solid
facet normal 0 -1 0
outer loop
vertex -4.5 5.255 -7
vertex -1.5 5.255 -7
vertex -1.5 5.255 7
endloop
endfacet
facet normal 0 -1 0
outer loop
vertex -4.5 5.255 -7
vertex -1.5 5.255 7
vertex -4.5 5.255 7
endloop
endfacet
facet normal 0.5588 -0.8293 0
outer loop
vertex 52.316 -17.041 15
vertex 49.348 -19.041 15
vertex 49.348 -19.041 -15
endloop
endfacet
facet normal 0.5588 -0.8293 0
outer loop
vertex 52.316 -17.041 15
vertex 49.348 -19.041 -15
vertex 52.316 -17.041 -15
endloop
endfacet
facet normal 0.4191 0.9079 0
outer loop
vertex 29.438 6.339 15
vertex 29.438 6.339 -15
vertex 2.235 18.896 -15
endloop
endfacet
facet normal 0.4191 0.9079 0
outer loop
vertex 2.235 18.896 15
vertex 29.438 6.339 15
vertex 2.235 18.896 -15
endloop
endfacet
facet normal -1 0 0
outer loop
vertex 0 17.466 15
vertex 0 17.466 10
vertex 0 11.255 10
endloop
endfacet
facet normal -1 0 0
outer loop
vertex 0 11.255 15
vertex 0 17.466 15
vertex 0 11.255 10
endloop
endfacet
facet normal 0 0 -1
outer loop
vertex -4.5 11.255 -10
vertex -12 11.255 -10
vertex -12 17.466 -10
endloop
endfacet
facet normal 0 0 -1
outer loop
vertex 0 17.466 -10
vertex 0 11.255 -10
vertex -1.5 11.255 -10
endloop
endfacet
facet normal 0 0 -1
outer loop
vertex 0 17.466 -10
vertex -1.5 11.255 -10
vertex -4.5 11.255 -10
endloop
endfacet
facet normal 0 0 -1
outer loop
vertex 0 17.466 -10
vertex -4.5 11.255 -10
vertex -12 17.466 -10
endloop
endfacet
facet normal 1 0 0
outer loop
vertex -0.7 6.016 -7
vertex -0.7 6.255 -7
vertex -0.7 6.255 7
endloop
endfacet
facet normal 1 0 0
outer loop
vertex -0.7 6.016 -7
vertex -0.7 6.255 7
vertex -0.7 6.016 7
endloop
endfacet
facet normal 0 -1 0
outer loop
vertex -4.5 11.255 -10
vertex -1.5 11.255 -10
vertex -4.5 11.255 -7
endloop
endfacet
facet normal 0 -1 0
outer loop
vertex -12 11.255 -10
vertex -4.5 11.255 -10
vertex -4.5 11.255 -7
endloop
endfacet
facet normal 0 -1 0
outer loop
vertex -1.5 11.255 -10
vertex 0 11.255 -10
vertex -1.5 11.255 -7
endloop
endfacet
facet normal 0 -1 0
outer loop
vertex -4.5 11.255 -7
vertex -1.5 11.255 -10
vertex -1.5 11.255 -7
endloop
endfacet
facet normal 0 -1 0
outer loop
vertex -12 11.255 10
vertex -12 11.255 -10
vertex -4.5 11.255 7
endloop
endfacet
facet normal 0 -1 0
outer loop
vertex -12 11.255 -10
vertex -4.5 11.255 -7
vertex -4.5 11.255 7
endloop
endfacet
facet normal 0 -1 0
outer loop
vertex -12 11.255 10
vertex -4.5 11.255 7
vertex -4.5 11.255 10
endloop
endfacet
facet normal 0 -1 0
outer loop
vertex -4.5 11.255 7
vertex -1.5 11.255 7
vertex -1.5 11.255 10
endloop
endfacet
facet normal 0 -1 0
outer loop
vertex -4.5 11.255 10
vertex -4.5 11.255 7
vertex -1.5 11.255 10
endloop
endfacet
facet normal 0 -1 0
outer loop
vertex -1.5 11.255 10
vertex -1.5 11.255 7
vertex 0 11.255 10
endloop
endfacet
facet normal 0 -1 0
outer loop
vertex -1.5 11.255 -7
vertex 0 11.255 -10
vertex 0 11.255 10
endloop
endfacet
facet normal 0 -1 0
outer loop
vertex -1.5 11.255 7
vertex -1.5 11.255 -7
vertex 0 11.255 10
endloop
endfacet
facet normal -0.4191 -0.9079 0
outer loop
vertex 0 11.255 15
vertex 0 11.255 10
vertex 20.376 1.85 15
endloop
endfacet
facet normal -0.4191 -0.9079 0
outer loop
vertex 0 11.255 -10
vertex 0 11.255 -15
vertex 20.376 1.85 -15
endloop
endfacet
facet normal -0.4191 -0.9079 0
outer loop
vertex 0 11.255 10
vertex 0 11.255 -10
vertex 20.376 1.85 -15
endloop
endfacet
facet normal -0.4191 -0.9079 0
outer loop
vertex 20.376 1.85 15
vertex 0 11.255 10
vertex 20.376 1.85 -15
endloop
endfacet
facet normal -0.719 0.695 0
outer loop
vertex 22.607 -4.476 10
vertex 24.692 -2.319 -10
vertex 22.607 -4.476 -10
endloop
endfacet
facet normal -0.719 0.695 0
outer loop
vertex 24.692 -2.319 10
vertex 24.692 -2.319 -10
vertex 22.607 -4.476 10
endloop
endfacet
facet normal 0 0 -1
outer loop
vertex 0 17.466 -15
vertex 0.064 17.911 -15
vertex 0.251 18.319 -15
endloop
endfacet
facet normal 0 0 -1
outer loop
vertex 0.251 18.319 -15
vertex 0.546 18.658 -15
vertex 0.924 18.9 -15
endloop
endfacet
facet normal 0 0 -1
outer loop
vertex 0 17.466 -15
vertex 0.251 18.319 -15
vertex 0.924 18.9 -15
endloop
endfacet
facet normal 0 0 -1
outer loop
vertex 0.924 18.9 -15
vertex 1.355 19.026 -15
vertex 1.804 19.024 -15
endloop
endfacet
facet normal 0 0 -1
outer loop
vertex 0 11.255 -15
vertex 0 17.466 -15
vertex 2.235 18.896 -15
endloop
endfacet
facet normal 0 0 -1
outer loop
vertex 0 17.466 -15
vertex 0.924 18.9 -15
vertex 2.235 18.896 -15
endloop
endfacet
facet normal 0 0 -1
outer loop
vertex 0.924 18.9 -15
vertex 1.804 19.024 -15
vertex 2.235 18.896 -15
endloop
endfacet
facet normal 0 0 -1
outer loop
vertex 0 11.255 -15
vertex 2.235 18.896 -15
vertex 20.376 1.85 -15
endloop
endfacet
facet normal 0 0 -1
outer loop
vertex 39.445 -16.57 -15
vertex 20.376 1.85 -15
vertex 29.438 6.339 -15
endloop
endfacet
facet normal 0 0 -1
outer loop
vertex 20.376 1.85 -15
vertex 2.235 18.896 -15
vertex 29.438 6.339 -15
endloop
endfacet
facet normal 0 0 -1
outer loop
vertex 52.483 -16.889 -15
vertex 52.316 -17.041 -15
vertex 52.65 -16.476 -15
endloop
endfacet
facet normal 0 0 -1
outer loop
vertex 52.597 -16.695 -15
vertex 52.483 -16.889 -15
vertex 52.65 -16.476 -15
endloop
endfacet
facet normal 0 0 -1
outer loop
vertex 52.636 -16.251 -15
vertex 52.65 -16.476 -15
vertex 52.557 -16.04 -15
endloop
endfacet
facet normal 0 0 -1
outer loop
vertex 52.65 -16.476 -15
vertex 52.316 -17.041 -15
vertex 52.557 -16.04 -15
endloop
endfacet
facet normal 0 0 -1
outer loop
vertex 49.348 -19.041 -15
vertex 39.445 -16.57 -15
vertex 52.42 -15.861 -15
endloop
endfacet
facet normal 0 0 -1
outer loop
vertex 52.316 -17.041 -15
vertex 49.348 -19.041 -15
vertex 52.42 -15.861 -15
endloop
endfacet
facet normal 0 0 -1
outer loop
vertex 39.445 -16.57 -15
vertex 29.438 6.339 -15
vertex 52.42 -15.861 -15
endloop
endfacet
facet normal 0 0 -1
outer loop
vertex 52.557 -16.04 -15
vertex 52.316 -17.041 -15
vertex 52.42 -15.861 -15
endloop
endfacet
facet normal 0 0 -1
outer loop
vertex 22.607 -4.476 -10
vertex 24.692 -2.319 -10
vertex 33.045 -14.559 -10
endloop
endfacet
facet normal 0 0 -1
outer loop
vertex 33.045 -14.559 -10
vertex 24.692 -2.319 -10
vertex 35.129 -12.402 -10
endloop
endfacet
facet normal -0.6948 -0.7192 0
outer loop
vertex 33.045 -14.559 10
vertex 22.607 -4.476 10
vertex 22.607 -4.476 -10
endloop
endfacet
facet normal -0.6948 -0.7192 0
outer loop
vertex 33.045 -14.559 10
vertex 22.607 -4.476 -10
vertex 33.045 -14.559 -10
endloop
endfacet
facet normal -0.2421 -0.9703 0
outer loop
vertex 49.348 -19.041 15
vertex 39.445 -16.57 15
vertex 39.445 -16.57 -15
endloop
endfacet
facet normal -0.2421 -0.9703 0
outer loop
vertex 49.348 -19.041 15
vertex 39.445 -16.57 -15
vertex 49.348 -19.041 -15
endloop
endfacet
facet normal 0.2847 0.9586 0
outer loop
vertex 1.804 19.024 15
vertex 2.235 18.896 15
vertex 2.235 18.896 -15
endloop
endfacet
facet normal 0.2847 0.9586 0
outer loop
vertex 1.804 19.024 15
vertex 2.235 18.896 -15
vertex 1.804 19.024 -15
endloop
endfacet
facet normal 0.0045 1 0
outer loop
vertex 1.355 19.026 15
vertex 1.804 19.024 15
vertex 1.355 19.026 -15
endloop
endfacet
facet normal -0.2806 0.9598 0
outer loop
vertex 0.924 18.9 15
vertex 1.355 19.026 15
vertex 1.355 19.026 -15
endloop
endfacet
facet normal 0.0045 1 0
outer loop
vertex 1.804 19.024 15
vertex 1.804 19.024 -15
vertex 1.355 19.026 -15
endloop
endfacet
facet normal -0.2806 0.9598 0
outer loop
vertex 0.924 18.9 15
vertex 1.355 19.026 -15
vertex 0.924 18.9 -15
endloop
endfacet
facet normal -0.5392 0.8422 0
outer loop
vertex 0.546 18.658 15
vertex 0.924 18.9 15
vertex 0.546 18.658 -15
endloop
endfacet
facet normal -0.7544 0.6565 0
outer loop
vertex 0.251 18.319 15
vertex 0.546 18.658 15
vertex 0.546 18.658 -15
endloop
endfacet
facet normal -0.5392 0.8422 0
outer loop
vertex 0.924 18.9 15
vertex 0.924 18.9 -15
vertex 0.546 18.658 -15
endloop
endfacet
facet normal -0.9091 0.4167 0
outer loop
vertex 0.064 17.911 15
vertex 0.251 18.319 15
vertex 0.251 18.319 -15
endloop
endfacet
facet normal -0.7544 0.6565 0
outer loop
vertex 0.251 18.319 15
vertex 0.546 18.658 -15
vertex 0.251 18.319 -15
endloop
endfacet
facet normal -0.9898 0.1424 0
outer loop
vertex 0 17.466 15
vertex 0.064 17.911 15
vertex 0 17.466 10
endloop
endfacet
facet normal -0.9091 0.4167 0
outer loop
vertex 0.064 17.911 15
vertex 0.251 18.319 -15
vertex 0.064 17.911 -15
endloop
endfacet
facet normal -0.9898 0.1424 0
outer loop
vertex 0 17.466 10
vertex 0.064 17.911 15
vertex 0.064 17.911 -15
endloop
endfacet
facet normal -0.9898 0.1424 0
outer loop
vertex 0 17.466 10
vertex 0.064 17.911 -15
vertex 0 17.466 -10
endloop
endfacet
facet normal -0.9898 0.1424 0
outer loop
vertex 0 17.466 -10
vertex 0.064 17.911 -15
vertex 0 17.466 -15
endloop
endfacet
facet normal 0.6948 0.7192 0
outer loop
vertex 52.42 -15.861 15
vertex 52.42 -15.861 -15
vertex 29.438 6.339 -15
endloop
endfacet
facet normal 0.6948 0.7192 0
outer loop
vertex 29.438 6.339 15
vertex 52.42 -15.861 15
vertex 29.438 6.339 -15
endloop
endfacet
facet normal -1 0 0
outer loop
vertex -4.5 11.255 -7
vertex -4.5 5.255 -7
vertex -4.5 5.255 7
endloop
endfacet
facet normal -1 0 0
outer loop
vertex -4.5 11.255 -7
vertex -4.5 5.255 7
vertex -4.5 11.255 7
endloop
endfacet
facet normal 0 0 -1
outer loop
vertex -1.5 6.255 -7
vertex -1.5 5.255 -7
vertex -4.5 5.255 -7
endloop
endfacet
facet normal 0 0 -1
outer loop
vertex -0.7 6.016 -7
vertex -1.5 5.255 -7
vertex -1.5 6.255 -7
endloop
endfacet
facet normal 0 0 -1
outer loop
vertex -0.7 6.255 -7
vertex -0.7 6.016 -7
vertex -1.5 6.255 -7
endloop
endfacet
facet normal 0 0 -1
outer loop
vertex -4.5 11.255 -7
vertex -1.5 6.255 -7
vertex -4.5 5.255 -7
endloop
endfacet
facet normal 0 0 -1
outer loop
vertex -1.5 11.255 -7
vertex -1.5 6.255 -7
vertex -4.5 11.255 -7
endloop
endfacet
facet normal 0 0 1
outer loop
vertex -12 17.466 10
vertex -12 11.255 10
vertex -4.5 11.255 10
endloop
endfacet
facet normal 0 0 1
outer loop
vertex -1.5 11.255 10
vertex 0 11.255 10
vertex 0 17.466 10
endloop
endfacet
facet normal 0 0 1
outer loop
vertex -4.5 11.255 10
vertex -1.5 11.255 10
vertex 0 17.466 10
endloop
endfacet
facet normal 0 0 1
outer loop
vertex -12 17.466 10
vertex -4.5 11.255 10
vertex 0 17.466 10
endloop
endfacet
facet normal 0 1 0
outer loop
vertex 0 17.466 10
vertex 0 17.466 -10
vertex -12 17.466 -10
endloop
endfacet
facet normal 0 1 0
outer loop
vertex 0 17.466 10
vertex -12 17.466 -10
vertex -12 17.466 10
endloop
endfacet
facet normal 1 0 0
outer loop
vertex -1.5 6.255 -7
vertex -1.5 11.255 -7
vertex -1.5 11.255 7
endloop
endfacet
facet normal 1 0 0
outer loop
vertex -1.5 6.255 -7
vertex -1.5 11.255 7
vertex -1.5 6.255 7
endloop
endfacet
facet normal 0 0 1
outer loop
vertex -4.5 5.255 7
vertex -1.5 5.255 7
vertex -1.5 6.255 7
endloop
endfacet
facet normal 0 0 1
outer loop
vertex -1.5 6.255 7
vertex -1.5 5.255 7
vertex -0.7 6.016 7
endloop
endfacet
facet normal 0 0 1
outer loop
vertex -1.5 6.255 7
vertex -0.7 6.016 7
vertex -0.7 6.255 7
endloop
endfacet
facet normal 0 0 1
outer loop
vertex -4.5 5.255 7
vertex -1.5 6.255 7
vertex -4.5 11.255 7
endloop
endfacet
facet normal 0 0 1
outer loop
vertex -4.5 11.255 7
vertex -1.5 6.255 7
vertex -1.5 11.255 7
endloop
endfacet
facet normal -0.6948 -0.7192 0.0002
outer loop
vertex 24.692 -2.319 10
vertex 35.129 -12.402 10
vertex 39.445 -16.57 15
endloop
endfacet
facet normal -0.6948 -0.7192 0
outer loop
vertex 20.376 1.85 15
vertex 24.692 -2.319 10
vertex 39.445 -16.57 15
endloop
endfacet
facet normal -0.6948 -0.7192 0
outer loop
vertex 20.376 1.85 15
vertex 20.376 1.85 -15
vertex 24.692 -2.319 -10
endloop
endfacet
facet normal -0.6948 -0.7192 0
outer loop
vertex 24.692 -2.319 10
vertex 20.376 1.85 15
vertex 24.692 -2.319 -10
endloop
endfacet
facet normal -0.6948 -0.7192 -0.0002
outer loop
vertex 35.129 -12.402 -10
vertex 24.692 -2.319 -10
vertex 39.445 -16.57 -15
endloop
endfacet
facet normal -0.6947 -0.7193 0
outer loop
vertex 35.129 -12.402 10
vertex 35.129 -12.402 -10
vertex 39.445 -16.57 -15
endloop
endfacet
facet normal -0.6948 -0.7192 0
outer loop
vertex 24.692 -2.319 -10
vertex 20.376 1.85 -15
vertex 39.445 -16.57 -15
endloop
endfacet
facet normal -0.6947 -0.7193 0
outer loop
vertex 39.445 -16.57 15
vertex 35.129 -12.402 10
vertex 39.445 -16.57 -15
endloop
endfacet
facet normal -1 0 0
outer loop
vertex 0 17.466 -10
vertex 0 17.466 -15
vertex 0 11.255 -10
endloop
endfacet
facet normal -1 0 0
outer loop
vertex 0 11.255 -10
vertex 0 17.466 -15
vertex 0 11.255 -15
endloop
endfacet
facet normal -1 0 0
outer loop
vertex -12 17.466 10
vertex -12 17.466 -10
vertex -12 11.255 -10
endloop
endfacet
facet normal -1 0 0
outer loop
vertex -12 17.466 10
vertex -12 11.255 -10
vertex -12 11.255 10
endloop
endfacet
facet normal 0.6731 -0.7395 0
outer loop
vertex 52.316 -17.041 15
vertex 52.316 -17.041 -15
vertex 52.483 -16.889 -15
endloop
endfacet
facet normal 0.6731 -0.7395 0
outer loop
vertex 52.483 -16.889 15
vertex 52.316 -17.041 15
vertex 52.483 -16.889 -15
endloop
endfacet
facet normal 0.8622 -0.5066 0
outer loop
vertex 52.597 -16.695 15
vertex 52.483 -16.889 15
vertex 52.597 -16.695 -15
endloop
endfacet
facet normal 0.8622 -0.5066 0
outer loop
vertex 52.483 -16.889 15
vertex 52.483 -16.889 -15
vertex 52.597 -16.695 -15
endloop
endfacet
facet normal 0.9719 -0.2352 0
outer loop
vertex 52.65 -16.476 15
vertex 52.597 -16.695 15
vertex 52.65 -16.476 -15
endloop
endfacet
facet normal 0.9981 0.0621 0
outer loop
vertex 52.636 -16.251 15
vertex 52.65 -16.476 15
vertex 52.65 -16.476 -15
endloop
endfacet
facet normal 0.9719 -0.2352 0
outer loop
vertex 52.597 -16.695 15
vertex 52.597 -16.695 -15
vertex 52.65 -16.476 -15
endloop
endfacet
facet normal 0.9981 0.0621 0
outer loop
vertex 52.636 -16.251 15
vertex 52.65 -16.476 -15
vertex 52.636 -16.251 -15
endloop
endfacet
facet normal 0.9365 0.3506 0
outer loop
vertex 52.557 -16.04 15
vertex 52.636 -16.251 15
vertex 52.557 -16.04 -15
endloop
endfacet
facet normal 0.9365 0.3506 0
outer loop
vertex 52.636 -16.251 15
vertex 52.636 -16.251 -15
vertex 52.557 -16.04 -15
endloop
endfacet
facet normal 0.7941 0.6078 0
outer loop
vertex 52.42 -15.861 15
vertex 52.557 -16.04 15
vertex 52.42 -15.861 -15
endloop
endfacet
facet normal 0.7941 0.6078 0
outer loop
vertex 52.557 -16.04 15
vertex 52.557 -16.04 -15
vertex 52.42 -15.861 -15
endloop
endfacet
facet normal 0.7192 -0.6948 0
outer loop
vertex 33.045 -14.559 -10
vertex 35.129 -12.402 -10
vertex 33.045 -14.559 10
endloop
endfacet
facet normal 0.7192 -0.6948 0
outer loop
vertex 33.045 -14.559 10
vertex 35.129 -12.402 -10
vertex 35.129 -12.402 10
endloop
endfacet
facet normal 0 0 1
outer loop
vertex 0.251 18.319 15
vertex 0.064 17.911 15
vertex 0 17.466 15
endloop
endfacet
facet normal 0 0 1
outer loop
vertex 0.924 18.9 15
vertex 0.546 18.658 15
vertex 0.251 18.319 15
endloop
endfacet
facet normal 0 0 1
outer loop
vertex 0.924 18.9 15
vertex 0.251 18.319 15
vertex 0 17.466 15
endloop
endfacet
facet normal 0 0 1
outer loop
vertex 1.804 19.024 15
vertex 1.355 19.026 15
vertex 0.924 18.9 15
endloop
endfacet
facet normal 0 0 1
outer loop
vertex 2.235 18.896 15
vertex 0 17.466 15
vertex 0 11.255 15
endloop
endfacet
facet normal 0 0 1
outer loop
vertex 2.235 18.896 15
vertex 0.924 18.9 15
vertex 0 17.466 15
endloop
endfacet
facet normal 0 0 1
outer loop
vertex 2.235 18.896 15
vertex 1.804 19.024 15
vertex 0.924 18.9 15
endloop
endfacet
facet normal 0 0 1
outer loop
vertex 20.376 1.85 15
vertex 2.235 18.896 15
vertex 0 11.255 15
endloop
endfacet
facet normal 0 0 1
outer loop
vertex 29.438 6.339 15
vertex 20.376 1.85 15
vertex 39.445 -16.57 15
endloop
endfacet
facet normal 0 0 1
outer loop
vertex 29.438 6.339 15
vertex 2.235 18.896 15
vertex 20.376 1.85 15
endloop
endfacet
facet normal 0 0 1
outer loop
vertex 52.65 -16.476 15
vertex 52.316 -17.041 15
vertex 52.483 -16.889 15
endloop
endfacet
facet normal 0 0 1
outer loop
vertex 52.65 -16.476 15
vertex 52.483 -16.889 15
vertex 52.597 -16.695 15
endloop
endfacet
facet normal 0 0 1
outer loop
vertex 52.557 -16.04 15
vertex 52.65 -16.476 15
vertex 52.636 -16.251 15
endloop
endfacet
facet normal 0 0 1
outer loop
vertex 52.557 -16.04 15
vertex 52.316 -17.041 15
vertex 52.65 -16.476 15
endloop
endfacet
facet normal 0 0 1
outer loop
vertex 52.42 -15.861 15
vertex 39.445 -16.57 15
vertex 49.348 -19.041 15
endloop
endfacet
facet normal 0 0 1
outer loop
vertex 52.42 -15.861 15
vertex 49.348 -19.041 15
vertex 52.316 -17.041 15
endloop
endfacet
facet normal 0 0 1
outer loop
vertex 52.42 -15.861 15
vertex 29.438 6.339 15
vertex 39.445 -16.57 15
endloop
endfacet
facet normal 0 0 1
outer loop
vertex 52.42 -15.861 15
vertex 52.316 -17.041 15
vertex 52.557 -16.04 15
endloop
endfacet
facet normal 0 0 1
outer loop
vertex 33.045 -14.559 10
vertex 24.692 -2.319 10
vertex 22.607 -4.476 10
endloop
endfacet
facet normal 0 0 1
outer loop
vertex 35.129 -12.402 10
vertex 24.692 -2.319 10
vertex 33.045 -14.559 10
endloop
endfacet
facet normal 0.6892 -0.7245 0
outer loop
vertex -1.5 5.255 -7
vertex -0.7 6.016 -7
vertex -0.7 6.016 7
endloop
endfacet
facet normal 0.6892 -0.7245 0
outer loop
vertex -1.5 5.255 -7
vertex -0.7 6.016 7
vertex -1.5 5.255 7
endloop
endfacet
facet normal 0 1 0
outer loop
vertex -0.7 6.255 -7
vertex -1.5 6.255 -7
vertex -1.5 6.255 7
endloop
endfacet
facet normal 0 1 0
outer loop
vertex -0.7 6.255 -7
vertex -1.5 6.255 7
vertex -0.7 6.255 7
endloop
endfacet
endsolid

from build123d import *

# Parameters (mm, degrees)
RESSALTO_EXTRUS_O1_DEPTH      = 15
RESSALTO_EXTRUS_O1_DEPTH_BACK = 15
ESBO_O2_W                     = 20
ESBO_O2_H                     = 6.210978077
RESSALTO_EXTRUS_O2_DEPTH      = 12
RESSALTO_EXTRUS_O3_START      = -20
RESSALTO_EXTRUS_O3_DEPTH      = 20
CORTE_EXTRUS_O1_START         = -3.8
ESBO_O6_W                     = 3
ESBO_O6_H                     = 6
CORTE_EXTRUS_O1_DEPTH         = 3.8
ESBO_O7_W                     = 14.512469108
ESBO_O7_H                     = 20
RESSALTO_EXTRUS_O4_DEPTH      = 3


with BuildPart() as part:
    # Esboço1 → Ressalto-extrusão1 (new, two sides: drawn at the far end of the back side and taken through both)
    with BuildSketch(Plane.XY.offset(-RESSALTO_EXTRUS_O1_DEPTH_BACK)):
        with BuildLine():
            Line((0, 16.196411572), (0, 11.255433495))
            Line((0, 11.255433495), (20.3764132, 1.849909993))
            Line((20.3764132, 1.849909993), (39.444832225, -16.570361831))
            Line((39.444832225, -16.570361831), (49.347871005, -19.041211572))
            Line((49.347871005, -19.041211572), (52.316343324, -17.041005068))
            ThreePointArc((52.316343324, -17.041005068), (52.649617834, -16.475732), (52.419959407, -15.861026747))
            Line((52.419959407, -15.861026747), (29.43843308, 6.339343474))
            Line((29.43843308, 6.339343474), (2.234792117, 18.89623864))
            ThreePointArc((2.234792117, 18.89623864), (0.726083483, 18.792939111), (0, 17.466411572))
            Line((0, 17.466411572), (0, 16.196411572))
        make_face()
    extrude(amount=RESSALTO_EXTRUS_O1_DEPTH + RESSALTO_EXTRUS_O1_DEPTH_BACK)

    # Esboço2 → Ressalto-extrusão2 (add)
    with BuildSketch(Plane.ZY):
        with Locations((0, 14.360922534)):
            Rectangle(ESBO_O2_W, ESBO_O2_H)
    extrude(amount=RESSALTO_EXTRUS_O2_DEPTH)

    # Esboço4 → Ressalto-extrusão3 (add)
    with BuildSketch(Plane.XY.offset(10).offset(RESSALTO_EXTRUS_O3_START)):
        Polygon((-4.5, 11.255433495), (-1.5, 11.255433495), (-1.5, 6.255433495), (-0.7, 6.255433495), (-0.7, 6.015731828), (-1.5, 5.255433495), (-4.5, 5.255433495), align=None)
    extrude(amount=RESSALTO_EXTRUS_O3_DEPTH)

    # Esboço6 → Corte-extrusão1 (cut)
    with BuildSketch(Plane.ZY.offset(4.5).offset(CORTE_EXTRUS_O1_START)):
        with Locations((-8.5, 8.255433495)):
            Rectangle(ESBO_O6_W, ESBO_O6_H)
        with Locations((8.5, 8.255433495)):
            Rectangle(ESBO_O6_W, ESBO_O6_H)
    extrude(amount=CORTE_EXTRUS_O1_DEPTH, mode=Mode.SUBTRACT)

    # Esboço7 → Ressalto-extrusão4 (add)
    with BuildSketch(Plane(origin=(10.760423423, 11.139046409, 0), x_dir=(0.7192245636353503, -0.6947776817540559, 0), z_dir=(-0.6947776817540559, -0.7192245636353503, 0))):
        with Locations((26.62617527, 0)):
            Rectangle(ESBO_O7_W, ESBO_O7_H)
    extrude(amount=RESSALTO_EXTRUS_O4_DEPTH)


solid = part.part
